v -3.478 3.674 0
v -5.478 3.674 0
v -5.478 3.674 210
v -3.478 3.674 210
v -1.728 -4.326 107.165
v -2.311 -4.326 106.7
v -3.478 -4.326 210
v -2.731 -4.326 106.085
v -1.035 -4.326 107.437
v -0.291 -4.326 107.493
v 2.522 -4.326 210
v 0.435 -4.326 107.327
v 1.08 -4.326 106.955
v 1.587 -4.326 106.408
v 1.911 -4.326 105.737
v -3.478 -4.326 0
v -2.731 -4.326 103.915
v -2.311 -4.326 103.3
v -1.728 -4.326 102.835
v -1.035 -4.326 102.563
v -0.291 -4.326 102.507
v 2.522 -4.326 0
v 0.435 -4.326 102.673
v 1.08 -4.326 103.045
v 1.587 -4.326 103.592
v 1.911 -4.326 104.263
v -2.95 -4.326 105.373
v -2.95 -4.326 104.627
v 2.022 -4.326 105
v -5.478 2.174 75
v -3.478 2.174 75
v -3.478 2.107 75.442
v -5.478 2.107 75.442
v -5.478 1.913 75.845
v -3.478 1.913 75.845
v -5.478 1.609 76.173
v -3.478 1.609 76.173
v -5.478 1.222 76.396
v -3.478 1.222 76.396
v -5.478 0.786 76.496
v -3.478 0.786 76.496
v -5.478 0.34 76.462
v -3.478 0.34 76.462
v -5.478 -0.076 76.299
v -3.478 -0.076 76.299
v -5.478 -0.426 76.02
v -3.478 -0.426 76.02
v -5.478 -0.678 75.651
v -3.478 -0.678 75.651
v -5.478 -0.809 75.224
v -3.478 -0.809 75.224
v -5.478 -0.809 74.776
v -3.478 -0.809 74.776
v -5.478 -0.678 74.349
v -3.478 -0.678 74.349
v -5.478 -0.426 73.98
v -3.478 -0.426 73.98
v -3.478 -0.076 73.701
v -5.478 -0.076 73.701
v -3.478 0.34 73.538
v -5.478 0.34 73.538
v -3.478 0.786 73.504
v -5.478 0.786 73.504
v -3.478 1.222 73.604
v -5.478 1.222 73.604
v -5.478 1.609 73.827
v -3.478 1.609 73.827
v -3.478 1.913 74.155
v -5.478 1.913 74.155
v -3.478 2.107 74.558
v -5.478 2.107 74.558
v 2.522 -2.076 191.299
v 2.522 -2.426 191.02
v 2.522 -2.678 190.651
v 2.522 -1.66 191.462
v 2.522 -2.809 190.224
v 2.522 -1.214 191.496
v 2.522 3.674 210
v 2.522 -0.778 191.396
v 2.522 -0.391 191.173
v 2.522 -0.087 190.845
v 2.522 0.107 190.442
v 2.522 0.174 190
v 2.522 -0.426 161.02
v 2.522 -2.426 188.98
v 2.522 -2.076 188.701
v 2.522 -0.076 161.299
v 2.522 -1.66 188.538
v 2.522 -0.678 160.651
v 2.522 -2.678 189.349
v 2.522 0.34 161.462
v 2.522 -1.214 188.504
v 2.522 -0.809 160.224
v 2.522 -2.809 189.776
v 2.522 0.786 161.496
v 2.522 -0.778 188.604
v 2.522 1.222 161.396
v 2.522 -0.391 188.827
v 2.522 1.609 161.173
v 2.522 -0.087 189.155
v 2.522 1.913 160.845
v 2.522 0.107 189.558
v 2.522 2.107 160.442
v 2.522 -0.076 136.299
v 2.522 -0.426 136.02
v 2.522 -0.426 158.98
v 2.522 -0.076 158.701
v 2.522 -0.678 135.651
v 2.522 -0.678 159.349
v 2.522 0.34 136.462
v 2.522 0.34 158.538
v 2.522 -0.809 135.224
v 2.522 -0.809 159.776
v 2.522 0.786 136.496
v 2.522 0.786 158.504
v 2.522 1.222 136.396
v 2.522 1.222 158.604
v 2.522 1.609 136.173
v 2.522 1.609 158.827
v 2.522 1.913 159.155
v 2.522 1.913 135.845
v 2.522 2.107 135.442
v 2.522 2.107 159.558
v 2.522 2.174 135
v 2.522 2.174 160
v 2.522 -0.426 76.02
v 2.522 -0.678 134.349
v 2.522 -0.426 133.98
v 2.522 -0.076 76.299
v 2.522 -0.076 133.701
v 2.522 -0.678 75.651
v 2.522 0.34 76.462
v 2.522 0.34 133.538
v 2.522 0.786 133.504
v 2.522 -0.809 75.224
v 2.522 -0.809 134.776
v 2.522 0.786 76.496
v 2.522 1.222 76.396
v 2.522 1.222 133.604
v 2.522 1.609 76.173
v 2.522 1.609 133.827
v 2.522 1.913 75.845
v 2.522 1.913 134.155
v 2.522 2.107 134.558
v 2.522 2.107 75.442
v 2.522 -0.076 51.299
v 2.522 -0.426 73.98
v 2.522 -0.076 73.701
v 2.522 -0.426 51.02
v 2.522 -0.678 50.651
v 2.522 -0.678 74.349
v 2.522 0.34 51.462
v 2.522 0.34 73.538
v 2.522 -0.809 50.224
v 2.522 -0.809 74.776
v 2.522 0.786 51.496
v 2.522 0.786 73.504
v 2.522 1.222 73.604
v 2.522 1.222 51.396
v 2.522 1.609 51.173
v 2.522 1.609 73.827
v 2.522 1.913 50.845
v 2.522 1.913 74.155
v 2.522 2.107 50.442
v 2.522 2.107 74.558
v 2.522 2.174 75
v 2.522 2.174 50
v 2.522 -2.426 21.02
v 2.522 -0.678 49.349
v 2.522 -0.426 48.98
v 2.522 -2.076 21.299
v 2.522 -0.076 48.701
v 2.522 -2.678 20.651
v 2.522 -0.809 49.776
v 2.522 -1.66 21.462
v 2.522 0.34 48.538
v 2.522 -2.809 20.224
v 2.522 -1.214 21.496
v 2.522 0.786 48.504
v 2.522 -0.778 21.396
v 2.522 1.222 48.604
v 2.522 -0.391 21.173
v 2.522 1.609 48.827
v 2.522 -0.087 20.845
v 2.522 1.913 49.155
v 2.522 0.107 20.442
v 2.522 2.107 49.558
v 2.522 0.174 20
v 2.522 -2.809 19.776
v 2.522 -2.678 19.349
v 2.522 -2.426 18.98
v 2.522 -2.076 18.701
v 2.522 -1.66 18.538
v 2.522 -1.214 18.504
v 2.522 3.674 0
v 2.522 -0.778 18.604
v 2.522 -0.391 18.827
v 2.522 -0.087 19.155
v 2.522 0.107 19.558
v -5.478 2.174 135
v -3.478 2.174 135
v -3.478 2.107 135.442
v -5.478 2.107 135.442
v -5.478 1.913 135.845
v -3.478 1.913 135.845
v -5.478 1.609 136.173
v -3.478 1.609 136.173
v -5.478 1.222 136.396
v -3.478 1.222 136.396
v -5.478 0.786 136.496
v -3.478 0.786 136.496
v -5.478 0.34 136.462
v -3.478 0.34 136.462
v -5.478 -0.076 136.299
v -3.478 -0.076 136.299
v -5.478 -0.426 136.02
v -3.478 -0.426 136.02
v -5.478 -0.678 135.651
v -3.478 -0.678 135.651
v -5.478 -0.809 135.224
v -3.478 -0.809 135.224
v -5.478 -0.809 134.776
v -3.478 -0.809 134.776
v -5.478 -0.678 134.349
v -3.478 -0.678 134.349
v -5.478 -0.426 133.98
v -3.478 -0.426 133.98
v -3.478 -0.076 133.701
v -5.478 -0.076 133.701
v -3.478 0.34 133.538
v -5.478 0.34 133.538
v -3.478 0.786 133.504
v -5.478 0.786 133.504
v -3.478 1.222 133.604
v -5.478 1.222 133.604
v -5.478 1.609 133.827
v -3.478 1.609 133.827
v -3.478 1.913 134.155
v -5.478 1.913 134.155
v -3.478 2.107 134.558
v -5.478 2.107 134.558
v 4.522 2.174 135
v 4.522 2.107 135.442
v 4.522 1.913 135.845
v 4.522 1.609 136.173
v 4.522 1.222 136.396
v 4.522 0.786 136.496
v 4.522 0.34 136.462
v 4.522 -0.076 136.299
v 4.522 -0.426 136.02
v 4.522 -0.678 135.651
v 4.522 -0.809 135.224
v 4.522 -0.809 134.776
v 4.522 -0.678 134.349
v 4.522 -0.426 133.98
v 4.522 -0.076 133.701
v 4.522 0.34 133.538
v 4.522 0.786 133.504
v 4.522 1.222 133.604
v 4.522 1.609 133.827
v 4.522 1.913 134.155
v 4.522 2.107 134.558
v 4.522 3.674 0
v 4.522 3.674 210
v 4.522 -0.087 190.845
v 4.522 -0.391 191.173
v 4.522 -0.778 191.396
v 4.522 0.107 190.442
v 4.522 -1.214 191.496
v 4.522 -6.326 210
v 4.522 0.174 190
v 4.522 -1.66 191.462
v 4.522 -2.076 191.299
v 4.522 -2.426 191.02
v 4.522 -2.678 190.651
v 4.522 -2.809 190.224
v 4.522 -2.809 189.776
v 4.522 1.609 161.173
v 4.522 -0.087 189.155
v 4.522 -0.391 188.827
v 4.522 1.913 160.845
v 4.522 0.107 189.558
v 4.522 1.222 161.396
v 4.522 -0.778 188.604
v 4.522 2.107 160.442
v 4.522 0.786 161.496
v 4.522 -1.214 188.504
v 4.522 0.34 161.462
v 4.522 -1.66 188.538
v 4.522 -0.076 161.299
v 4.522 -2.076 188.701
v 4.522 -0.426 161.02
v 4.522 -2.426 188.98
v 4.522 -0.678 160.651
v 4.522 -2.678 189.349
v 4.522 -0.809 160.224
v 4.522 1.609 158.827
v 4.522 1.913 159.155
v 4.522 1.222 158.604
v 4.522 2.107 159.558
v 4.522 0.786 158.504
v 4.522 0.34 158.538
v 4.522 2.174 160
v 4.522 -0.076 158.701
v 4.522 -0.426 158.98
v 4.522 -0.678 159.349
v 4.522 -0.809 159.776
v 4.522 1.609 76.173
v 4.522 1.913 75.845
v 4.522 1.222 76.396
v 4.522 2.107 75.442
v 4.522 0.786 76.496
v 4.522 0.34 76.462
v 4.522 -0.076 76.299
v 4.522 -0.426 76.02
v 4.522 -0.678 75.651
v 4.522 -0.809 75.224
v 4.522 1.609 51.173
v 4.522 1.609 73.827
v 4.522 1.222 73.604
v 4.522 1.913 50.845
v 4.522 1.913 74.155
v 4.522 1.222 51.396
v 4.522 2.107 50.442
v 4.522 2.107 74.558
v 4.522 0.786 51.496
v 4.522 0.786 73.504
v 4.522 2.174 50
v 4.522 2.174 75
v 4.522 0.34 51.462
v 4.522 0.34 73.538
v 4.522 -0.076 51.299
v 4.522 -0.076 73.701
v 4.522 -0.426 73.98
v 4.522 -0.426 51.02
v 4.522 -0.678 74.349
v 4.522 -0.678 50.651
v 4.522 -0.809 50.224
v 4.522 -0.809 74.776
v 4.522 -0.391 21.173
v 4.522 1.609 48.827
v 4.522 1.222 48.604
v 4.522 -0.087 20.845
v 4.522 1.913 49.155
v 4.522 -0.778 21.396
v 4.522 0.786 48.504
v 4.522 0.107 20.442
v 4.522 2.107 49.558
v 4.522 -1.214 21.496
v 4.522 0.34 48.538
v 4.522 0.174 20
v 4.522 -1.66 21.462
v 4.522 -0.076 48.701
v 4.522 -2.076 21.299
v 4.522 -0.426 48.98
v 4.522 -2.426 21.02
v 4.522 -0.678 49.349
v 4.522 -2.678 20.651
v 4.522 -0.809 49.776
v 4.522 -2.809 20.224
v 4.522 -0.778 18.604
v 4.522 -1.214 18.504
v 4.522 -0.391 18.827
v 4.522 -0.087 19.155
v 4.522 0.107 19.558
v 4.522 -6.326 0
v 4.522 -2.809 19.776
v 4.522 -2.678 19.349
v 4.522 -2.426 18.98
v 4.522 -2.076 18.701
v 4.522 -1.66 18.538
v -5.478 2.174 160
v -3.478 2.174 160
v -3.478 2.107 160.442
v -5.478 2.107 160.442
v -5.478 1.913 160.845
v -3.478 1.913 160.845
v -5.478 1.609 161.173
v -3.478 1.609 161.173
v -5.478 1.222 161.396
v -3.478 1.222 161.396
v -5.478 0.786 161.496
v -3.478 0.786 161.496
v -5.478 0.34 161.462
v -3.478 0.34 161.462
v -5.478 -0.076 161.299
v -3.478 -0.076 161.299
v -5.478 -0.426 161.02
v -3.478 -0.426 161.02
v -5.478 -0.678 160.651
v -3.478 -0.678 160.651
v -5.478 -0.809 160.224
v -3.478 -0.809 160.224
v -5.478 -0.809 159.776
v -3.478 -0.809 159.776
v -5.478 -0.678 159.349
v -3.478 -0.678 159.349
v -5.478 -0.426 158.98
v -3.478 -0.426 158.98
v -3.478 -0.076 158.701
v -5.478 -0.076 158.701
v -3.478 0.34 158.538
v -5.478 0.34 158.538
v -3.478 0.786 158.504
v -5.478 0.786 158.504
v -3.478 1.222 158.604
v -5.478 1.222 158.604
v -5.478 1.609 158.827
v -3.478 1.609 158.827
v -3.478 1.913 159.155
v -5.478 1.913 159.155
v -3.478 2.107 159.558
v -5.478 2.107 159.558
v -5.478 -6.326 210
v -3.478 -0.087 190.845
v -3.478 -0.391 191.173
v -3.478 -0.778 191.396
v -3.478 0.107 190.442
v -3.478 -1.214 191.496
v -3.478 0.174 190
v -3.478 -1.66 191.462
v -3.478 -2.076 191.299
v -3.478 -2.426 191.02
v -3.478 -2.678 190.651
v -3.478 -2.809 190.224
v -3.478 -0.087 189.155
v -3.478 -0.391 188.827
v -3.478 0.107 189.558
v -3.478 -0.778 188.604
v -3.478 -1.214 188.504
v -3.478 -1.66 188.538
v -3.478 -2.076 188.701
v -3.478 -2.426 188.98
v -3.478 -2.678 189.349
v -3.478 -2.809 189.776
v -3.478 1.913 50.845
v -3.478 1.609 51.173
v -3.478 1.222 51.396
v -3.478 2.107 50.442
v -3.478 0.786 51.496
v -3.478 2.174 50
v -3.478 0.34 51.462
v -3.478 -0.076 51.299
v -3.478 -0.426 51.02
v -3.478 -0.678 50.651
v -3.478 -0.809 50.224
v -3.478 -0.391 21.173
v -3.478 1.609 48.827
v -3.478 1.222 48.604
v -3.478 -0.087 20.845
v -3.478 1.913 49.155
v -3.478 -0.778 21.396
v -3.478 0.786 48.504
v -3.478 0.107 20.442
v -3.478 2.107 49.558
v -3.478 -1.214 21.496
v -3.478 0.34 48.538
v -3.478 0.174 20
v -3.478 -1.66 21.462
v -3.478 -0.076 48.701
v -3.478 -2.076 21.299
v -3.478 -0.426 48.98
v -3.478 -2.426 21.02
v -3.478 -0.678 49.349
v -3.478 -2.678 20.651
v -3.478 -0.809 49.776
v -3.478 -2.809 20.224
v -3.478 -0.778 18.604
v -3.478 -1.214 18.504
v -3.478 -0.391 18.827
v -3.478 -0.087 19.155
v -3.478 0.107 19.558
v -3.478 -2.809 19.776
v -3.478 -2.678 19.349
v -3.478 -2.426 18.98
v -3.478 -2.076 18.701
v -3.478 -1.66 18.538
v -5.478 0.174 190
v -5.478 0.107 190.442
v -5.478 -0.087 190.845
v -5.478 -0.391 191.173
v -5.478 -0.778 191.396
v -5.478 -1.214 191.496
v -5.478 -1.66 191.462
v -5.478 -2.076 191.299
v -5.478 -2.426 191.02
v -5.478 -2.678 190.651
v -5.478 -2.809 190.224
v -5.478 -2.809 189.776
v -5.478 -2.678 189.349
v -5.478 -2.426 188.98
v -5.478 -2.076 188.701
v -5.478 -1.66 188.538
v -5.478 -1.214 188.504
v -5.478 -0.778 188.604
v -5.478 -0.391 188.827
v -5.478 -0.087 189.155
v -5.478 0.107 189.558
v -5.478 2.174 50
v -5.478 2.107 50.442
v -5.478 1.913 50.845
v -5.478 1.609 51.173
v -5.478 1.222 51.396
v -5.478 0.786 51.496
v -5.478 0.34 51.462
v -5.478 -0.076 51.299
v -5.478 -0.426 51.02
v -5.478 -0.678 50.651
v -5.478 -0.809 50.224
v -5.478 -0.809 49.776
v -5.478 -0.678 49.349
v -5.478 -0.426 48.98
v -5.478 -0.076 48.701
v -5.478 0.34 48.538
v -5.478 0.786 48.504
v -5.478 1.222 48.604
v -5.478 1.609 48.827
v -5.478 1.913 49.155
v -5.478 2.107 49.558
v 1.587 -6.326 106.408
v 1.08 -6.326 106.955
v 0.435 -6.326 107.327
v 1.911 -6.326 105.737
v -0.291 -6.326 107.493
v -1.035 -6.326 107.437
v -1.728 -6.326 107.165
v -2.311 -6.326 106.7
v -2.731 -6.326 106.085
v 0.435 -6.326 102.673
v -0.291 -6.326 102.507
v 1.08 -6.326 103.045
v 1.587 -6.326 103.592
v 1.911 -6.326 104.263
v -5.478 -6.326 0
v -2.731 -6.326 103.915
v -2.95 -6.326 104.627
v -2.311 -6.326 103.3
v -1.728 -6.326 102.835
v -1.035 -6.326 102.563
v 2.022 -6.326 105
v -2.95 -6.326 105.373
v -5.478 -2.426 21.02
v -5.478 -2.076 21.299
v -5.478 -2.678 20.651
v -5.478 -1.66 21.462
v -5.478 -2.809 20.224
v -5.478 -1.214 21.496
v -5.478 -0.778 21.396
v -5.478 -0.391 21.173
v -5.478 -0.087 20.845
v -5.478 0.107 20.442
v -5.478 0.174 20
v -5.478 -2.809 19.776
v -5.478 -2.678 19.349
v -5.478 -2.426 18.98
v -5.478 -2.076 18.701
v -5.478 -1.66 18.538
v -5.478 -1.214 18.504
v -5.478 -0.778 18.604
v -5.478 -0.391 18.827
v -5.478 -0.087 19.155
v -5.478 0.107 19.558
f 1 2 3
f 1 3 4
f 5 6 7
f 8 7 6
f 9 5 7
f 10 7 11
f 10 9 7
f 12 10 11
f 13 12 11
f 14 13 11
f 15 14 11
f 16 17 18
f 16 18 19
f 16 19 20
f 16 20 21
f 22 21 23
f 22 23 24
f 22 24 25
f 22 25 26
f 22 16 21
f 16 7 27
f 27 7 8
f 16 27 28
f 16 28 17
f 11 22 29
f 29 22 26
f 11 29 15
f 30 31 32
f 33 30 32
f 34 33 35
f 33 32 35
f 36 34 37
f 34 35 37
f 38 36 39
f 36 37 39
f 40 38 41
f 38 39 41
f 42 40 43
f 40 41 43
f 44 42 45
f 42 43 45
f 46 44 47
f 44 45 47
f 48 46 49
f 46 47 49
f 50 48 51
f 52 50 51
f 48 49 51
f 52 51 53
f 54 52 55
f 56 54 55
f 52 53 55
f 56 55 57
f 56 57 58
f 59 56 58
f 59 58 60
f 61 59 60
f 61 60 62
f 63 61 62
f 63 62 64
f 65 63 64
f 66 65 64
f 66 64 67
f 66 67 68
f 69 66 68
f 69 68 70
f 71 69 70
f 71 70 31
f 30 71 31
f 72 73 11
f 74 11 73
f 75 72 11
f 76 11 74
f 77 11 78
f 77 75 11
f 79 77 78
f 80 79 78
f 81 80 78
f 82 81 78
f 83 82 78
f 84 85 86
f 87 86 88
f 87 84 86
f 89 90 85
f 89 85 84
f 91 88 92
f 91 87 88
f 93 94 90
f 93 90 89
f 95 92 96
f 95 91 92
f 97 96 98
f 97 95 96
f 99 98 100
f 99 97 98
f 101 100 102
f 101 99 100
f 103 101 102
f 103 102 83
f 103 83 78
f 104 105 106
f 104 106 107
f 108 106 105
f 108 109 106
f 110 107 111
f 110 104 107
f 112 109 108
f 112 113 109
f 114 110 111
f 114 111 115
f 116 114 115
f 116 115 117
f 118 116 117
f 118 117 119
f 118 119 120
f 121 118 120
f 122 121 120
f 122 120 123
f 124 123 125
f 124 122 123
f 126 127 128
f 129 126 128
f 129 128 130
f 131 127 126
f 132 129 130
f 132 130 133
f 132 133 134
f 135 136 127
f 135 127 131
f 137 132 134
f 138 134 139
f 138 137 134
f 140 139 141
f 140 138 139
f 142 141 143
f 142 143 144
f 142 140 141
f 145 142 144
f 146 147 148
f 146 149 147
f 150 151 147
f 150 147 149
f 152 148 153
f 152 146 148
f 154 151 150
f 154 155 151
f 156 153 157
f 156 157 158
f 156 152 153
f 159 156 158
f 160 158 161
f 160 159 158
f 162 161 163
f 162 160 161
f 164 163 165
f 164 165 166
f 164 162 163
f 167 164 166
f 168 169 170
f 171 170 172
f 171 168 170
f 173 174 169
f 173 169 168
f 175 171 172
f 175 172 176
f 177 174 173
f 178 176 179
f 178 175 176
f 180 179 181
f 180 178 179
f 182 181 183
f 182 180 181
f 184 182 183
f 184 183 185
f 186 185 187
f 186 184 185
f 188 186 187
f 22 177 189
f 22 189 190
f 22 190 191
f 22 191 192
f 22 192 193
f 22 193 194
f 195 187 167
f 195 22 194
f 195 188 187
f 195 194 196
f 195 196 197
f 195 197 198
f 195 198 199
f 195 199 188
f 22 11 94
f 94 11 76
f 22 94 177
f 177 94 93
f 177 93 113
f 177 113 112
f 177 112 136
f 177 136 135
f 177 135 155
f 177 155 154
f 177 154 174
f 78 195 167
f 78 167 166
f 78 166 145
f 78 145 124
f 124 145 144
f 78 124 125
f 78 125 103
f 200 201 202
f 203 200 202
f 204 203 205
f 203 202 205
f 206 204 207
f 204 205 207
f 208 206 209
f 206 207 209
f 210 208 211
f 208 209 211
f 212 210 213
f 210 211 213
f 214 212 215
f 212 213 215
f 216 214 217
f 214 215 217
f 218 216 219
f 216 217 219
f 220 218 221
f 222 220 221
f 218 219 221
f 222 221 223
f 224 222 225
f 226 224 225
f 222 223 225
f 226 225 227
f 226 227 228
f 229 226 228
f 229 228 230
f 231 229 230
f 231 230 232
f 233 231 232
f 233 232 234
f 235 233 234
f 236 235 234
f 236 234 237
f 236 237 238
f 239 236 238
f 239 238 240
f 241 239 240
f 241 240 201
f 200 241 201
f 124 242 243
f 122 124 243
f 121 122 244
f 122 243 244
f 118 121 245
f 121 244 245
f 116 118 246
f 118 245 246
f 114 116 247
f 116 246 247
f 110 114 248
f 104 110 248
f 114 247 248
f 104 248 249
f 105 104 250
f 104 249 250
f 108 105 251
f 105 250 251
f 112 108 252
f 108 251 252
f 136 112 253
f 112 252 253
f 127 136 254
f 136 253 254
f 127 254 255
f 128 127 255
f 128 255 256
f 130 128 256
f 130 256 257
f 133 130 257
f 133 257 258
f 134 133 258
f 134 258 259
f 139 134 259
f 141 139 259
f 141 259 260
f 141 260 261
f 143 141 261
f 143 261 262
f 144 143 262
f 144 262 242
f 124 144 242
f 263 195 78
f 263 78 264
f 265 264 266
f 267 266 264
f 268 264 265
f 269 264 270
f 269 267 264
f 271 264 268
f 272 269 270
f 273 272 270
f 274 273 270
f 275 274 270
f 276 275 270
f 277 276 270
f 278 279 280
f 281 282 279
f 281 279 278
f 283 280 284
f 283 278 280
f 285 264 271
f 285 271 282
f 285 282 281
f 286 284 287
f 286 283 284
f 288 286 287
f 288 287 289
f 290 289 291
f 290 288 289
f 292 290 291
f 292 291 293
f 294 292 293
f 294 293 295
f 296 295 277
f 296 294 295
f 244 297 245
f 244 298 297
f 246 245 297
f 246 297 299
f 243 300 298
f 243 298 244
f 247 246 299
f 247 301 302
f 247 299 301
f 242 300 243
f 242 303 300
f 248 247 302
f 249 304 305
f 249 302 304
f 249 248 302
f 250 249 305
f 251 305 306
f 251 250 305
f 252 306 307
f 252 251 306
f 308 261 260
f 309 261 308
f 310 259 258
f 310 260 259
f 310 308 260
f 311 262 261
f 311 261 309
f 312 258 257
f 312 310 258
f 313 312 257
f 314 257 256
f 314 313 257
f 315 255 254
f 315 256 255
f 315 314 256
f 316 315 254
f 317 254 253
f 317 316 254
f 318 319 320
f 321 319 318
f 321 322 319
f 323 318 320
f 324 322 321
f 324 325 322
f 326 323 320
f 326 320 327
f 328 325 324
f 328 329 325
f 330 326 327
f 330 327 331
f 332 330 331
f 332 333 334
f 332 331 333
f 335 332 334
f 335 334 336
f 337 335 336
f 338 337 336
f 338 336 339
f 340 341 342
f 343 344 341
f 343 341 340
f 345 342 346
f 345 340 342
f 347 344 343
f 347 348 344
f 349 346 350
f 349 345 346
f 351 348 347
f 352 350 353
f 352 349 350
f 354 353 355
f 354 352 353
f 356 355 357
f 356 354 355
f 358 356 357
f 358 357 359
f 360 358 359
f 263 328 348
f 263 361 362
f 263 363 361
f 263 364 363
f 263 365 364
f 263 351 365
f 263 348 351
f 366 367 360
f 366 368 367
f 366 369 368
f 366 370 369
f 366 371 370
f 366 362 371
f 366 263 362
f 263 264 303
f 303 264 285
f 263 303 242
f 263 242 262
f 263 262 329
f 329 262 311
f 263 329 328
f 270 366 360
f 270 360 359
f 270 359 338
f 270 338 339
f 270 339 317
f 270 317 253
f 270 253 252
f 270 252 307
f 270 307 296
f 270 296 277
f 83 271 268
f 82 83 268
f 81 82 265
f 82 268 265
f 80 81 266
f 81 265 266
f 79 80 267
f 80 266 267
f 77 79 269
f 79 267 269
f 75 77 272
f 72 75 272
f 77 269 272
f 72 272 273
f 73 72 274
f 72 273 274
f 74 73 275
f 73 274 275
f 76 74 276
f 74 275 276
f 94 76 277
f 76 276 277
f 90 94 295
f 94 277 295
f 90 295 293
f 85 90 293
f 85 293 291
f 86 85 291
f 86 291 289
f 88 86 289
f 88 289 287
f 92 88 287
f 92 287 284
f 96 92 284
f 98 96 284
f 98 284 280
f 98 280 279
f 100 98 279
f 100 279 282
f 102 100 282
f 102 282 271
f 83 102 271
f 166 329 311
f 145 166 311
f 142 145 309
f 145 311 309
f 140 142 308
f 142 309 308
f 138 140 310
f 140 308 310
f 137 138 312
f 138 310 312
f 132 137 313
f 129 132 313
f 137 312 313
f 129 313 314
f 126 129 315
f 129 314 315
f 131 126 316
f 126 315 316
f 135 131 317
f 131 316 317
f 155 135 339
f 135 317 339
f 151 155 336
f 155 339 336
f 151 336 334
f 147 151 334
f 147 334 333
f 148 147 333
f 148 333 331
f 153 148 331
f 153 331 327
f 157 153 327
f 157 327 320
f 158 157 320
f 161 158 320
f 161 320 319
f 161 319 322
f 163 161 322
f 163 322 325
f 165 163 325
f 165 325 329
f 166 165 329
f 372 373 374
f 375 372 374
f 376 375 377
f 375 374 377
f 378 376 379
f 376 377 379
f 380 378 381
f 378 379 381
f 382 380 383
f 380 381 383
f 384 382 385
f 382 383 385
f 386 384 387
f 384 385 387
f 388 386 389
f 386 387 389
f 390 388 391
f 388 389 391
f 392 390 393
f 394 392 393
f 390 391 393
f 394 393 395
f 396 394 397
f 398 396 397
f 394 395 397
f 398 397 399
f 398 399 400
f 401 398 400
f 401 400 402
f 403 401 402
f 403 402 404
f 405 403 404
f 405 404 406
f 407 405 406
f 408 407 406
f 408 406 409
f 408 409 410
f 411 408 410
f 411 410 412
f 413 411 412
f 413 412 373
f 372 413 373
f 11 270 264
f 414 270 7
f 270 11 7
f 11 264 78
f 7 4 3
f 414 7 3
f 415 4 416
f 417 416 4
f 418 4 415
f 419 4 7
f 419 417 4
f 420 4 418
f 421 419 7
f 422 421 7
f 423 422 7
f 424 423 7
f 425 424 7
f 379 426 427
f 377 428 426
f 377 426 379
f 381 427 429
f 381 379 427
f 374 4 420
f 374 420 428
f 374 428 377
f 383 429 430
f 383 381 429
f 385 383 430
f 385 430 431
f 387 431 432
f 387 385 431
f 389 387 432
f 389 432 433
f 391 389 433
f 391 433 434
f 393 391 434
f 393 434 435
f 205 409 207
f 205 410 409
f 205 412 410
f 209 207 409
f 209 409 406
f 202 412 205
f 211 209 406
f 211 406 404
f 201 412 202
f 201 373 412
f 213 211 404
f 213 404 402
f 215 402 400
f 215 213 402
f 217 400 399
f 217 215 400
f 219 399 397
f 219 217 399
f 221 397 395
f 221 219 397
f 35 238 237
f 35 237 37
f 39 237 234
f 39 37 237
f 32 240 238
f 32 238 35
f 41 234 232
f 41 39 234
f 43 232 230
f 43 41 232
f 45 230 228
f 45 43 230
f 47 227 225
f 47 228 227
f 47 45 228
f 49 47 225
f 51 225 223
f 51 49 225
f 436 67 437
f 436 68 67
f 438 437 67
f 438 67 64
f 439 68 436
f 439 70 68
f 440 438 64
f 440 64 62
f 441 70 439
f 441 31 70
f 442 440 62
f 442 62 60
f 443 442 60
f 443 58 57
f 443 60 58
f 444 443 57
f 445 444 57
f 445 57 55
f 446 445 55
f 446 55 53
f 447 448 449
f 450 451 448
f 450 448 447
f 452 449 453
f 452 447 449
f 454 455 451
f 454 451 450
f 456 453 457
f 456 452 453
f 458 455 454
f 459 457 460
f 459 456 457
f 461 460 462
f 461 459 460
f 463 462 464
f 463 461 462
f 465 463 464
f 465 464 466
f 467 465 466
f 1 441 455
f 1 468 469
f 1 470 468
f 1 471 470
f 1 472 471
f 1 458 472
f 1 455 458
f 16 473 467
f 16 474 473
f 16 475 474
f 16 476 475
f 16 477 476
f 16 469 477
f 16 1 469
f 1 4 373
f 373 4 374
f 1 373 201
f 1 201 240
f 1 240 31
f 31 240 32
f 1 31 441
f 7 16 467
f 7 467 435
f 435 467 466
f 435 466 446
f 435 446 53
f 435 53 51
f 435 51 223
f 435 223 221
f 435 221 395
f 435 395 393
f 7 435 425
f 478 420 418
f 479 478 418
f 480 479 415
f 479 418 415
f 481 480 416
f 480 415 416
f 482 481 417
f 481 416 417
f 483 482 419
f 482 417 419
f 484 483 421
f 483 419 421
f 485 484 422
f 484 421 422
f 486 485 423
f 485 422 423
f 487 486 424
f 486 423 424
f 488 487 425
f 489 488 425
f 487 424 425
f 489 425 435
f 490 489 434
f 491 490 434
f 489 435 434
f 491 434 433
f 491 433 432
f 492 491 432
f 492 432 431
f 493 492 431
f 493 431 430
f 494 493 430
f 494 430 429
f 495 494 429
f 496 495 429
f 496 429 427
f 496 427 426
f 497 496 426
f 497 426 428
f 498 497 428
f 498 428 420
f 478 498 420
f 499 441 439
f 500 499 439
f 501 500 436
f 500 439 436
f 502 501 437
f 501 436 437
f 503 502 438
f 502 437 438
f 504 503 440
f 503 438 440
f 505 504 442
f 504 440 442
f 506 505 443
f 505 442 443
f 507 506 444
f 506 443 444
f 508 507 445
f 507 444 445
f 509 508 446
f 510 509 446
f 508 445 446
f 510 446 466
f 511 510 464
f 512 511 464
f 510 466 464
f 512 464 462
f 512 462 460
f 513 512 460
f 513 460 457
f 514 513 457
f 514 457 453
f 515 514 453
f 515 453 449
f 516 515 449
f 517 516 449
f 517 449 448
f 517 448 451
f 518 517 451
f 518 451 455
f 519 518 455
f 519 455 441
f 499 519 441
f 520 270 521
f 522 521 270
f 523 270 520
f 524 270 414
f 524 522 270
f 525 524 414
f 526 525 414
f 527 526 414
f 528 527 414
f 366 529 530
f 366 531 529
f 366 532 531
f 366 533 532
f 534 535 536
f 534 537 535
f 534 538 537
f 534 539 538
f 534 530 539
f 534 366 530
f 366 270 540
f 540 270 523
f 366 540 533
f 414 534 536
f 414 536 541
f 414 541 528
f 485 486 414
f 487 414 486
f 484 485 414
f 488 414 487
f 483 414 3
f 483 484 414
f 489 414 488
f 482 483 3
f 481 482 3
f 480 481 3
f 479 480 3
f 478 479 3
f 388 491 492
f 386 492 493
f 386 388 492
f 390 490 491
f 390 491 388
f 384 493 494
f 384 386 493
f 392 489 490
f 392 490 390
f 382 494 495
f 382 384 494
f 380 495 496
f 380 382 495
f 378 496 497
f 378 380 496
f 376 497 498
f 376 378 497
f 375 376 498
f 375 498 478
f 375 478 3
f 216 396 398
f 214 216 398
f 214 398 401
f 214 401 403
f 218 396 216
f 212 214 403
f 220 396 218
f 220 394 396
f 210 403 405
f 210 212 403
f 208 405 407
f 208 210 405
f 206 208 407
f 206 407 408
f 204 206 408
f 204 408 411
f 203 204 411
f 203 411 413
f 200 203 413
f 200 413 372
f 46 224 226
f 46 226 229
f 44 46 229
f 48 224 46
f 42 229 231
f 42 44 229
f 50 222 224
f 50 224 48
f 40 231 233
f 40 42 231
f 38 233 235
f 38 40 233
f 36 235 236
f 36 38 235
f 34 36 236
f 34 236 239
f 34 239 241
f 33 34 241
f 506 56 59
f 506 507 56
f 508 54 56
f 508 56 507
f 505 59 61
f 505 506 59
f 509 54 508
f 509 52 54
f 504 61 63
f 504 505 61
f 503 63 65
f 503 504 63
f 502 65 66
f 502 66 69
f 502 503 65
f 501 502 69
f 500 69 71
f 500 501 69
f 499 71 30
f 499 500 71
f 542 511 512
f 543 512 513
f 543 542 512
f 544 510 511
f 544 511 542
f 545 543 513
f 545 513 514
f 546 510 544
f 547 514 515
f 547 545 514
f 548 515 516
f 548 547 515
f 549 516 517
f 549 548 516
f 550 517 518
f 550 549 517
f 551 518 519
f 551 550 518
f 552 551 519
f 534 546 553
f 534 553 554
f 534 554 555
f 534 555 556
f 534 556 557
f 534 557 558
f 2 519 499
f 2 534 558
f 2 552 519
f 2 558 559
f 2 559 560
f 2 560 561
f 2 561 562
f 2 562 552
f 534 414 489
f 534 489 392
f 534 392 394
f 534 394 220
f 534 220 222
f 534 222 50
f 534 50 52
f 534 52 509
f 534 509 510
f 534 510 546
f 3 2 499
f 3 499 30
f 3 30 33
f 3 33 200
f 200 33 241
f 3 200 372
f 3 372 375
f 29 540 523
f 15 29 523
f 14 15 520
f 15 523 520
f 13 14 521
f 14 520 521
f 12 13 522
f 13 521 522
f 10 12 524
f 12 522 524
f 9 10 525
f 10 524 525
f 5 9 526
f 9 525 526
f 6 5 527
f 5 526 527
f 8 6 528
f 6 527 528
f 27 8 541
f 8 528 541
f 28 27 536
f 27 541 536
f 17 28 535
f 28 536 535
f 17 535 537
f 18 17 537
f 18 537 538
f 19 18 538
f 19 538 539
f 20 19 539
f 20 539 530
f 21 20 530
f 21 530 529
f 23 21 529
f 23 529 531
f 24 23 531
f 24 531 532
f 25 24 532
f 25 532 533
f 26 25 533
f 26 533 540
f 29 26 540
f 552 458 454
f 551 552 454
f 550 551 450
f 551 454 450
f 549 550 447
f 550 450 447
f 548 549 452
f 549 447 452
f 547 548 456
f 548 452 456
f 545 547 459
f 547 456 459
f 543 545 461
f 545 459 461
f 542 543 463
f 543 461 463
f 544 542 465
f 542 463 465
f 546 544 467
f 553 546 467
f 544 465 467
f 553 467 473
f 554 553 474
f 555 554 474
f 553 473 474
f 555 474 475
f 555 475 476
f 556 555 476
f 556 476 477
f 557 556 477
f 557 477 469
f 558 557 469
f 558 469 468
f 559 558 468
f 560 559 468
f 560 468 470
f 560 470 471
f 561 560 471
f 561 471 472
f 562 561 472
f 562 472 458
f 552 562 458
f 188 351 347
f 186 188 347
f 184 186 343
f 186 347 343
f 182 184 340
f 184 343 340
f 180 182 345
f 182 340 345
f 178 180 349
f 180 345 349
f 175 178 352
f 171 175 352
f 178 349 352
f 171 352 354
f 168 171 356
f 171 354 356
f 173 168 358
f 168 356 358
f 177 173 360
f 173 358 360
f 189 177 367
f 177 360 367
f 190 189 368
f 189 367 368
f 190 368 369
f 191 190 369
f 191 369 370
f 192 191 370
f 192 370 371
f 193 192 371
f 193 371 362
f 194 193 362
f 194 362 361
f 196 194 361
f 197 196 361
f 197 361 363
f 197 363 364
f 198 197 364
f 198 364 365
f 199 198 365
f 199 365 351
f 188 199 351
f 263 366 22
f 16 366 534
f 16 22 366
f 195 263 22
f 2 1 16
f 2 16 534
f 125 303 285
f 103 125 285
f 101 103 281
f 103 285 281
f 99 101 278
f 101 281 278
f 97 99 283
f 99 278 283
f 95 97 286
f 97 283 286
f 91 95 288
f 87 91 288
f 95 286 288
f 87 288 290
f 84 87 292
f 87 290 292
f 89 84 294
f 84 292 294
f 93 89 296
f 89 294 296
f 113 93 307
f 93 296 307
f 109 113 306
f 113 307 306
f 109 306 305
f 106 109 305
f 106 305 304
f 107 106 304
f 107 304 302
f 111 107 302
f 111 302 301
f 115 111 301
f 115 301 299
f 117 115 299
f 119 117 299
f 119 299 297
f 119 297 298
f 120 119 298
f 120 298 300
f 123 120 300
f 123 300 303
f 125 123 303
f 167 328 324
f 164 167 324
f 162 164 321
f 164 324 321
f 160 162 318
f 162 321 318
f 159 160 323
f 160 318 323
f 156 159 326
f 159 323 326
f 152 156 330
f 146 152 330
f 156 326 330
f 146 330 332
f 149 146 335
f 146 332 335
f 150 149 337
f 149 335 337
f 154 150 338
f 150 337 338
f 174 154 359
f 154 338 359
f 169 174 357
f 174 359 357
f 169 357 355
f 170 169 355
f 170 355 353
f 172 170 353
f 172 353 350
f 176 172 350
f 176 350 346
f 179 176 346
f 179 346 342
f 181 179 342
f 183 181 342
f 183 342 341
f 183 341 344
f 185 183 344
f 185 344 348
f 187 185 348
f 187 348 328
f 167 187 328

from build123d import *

# Parameters (mm, degrees)
EXTRUDE_1_DEPTH     = 210
SKETCH_2_R          = 1.5
CUT_EXTRUDE_1_DEPTH = 10
SKETCH_3_R          = 1.5
CUT_EXTRUDE_2_DEPTH = 10
SKETCH_5_R          = 2.5
CUT_EXTRUDE_3_DEPTH = 10


with BuildPart() as part:
    # 草图1 → 凸台-拉伸1 (new body)
    with BuildSketch(Plane.XY):
        Polygon((2.52173913, 3.673913043), (4.52173913, 3.673913043), (4.52173913, -6.326086957), (-5.47826087, -6.326086957), (-5.47826087, 3.673913043), (-3.47826087, 3.673913043), (-3.47826087, -4.326086957), (2.52173913, -4.326086957), align=None)
    extrude(amount=EXTRUDE_1_DEPTH)

    # 草图2 → 切除-拉伸1 (cut)
    with BuildSketch(Plane(origin=(4.52173913, 0, 0), x_dir=(0, 0, -1), z_dir=(1, 0, 0))):
        with Locations(Location((-160, 0.673913043, 0), (0, 0, 90))):
            Circle(SKETCH_2_R)
        with Locations(Location((-135, 0.673913043, 0), (0, 0, 90))):
            Circle(SKETCH_2_R)
        with Locations(Location((-75, 0.673913043, 0), (0, 0, 90))):
            Circle(SKETCH_2_R)
        with Locations(Location((-50, 0.673913043, 0), (0, 0, 90))):
            Circle(SKETCH_2_R)
    extrude(amount=-CUT_EXTRUDE_1_DEPTH, mode=Mode.SUBTRACT)

    # 草图3 → 切除-拉伸2 (cut)
    with BuildSketch(Plane(origin=(4.52173913, 0, 0), x_dir=(0, 0, -1), z_dir=(1, 0, 0))):
        with Locations(Location((-20, -1.326086957, 0), (0, 0, 90))):
            Circle(SKETCH_3_R)
        with Locations(Location((-190, -1.326086957, 0), (0, 0, 90))):
            Circle(SKETCH_3_R)
    extrude(amount=-CUT_EXTRUDE_2_DEPTH, mode=Mode.SUBTRACT)

    # 草图5 → 切除-拉伸3 (cut)
    with BuildSketch(Plane.XZ.offset(6.326086957)):
        with Locations((-0.47826087, 105)):
            Circle(SKETCH_5_R)
    extrude(amount=-CUT_EXTRUDE_3_DEPTH, mode=Mode.SUBTRACT)


solid = part.part
